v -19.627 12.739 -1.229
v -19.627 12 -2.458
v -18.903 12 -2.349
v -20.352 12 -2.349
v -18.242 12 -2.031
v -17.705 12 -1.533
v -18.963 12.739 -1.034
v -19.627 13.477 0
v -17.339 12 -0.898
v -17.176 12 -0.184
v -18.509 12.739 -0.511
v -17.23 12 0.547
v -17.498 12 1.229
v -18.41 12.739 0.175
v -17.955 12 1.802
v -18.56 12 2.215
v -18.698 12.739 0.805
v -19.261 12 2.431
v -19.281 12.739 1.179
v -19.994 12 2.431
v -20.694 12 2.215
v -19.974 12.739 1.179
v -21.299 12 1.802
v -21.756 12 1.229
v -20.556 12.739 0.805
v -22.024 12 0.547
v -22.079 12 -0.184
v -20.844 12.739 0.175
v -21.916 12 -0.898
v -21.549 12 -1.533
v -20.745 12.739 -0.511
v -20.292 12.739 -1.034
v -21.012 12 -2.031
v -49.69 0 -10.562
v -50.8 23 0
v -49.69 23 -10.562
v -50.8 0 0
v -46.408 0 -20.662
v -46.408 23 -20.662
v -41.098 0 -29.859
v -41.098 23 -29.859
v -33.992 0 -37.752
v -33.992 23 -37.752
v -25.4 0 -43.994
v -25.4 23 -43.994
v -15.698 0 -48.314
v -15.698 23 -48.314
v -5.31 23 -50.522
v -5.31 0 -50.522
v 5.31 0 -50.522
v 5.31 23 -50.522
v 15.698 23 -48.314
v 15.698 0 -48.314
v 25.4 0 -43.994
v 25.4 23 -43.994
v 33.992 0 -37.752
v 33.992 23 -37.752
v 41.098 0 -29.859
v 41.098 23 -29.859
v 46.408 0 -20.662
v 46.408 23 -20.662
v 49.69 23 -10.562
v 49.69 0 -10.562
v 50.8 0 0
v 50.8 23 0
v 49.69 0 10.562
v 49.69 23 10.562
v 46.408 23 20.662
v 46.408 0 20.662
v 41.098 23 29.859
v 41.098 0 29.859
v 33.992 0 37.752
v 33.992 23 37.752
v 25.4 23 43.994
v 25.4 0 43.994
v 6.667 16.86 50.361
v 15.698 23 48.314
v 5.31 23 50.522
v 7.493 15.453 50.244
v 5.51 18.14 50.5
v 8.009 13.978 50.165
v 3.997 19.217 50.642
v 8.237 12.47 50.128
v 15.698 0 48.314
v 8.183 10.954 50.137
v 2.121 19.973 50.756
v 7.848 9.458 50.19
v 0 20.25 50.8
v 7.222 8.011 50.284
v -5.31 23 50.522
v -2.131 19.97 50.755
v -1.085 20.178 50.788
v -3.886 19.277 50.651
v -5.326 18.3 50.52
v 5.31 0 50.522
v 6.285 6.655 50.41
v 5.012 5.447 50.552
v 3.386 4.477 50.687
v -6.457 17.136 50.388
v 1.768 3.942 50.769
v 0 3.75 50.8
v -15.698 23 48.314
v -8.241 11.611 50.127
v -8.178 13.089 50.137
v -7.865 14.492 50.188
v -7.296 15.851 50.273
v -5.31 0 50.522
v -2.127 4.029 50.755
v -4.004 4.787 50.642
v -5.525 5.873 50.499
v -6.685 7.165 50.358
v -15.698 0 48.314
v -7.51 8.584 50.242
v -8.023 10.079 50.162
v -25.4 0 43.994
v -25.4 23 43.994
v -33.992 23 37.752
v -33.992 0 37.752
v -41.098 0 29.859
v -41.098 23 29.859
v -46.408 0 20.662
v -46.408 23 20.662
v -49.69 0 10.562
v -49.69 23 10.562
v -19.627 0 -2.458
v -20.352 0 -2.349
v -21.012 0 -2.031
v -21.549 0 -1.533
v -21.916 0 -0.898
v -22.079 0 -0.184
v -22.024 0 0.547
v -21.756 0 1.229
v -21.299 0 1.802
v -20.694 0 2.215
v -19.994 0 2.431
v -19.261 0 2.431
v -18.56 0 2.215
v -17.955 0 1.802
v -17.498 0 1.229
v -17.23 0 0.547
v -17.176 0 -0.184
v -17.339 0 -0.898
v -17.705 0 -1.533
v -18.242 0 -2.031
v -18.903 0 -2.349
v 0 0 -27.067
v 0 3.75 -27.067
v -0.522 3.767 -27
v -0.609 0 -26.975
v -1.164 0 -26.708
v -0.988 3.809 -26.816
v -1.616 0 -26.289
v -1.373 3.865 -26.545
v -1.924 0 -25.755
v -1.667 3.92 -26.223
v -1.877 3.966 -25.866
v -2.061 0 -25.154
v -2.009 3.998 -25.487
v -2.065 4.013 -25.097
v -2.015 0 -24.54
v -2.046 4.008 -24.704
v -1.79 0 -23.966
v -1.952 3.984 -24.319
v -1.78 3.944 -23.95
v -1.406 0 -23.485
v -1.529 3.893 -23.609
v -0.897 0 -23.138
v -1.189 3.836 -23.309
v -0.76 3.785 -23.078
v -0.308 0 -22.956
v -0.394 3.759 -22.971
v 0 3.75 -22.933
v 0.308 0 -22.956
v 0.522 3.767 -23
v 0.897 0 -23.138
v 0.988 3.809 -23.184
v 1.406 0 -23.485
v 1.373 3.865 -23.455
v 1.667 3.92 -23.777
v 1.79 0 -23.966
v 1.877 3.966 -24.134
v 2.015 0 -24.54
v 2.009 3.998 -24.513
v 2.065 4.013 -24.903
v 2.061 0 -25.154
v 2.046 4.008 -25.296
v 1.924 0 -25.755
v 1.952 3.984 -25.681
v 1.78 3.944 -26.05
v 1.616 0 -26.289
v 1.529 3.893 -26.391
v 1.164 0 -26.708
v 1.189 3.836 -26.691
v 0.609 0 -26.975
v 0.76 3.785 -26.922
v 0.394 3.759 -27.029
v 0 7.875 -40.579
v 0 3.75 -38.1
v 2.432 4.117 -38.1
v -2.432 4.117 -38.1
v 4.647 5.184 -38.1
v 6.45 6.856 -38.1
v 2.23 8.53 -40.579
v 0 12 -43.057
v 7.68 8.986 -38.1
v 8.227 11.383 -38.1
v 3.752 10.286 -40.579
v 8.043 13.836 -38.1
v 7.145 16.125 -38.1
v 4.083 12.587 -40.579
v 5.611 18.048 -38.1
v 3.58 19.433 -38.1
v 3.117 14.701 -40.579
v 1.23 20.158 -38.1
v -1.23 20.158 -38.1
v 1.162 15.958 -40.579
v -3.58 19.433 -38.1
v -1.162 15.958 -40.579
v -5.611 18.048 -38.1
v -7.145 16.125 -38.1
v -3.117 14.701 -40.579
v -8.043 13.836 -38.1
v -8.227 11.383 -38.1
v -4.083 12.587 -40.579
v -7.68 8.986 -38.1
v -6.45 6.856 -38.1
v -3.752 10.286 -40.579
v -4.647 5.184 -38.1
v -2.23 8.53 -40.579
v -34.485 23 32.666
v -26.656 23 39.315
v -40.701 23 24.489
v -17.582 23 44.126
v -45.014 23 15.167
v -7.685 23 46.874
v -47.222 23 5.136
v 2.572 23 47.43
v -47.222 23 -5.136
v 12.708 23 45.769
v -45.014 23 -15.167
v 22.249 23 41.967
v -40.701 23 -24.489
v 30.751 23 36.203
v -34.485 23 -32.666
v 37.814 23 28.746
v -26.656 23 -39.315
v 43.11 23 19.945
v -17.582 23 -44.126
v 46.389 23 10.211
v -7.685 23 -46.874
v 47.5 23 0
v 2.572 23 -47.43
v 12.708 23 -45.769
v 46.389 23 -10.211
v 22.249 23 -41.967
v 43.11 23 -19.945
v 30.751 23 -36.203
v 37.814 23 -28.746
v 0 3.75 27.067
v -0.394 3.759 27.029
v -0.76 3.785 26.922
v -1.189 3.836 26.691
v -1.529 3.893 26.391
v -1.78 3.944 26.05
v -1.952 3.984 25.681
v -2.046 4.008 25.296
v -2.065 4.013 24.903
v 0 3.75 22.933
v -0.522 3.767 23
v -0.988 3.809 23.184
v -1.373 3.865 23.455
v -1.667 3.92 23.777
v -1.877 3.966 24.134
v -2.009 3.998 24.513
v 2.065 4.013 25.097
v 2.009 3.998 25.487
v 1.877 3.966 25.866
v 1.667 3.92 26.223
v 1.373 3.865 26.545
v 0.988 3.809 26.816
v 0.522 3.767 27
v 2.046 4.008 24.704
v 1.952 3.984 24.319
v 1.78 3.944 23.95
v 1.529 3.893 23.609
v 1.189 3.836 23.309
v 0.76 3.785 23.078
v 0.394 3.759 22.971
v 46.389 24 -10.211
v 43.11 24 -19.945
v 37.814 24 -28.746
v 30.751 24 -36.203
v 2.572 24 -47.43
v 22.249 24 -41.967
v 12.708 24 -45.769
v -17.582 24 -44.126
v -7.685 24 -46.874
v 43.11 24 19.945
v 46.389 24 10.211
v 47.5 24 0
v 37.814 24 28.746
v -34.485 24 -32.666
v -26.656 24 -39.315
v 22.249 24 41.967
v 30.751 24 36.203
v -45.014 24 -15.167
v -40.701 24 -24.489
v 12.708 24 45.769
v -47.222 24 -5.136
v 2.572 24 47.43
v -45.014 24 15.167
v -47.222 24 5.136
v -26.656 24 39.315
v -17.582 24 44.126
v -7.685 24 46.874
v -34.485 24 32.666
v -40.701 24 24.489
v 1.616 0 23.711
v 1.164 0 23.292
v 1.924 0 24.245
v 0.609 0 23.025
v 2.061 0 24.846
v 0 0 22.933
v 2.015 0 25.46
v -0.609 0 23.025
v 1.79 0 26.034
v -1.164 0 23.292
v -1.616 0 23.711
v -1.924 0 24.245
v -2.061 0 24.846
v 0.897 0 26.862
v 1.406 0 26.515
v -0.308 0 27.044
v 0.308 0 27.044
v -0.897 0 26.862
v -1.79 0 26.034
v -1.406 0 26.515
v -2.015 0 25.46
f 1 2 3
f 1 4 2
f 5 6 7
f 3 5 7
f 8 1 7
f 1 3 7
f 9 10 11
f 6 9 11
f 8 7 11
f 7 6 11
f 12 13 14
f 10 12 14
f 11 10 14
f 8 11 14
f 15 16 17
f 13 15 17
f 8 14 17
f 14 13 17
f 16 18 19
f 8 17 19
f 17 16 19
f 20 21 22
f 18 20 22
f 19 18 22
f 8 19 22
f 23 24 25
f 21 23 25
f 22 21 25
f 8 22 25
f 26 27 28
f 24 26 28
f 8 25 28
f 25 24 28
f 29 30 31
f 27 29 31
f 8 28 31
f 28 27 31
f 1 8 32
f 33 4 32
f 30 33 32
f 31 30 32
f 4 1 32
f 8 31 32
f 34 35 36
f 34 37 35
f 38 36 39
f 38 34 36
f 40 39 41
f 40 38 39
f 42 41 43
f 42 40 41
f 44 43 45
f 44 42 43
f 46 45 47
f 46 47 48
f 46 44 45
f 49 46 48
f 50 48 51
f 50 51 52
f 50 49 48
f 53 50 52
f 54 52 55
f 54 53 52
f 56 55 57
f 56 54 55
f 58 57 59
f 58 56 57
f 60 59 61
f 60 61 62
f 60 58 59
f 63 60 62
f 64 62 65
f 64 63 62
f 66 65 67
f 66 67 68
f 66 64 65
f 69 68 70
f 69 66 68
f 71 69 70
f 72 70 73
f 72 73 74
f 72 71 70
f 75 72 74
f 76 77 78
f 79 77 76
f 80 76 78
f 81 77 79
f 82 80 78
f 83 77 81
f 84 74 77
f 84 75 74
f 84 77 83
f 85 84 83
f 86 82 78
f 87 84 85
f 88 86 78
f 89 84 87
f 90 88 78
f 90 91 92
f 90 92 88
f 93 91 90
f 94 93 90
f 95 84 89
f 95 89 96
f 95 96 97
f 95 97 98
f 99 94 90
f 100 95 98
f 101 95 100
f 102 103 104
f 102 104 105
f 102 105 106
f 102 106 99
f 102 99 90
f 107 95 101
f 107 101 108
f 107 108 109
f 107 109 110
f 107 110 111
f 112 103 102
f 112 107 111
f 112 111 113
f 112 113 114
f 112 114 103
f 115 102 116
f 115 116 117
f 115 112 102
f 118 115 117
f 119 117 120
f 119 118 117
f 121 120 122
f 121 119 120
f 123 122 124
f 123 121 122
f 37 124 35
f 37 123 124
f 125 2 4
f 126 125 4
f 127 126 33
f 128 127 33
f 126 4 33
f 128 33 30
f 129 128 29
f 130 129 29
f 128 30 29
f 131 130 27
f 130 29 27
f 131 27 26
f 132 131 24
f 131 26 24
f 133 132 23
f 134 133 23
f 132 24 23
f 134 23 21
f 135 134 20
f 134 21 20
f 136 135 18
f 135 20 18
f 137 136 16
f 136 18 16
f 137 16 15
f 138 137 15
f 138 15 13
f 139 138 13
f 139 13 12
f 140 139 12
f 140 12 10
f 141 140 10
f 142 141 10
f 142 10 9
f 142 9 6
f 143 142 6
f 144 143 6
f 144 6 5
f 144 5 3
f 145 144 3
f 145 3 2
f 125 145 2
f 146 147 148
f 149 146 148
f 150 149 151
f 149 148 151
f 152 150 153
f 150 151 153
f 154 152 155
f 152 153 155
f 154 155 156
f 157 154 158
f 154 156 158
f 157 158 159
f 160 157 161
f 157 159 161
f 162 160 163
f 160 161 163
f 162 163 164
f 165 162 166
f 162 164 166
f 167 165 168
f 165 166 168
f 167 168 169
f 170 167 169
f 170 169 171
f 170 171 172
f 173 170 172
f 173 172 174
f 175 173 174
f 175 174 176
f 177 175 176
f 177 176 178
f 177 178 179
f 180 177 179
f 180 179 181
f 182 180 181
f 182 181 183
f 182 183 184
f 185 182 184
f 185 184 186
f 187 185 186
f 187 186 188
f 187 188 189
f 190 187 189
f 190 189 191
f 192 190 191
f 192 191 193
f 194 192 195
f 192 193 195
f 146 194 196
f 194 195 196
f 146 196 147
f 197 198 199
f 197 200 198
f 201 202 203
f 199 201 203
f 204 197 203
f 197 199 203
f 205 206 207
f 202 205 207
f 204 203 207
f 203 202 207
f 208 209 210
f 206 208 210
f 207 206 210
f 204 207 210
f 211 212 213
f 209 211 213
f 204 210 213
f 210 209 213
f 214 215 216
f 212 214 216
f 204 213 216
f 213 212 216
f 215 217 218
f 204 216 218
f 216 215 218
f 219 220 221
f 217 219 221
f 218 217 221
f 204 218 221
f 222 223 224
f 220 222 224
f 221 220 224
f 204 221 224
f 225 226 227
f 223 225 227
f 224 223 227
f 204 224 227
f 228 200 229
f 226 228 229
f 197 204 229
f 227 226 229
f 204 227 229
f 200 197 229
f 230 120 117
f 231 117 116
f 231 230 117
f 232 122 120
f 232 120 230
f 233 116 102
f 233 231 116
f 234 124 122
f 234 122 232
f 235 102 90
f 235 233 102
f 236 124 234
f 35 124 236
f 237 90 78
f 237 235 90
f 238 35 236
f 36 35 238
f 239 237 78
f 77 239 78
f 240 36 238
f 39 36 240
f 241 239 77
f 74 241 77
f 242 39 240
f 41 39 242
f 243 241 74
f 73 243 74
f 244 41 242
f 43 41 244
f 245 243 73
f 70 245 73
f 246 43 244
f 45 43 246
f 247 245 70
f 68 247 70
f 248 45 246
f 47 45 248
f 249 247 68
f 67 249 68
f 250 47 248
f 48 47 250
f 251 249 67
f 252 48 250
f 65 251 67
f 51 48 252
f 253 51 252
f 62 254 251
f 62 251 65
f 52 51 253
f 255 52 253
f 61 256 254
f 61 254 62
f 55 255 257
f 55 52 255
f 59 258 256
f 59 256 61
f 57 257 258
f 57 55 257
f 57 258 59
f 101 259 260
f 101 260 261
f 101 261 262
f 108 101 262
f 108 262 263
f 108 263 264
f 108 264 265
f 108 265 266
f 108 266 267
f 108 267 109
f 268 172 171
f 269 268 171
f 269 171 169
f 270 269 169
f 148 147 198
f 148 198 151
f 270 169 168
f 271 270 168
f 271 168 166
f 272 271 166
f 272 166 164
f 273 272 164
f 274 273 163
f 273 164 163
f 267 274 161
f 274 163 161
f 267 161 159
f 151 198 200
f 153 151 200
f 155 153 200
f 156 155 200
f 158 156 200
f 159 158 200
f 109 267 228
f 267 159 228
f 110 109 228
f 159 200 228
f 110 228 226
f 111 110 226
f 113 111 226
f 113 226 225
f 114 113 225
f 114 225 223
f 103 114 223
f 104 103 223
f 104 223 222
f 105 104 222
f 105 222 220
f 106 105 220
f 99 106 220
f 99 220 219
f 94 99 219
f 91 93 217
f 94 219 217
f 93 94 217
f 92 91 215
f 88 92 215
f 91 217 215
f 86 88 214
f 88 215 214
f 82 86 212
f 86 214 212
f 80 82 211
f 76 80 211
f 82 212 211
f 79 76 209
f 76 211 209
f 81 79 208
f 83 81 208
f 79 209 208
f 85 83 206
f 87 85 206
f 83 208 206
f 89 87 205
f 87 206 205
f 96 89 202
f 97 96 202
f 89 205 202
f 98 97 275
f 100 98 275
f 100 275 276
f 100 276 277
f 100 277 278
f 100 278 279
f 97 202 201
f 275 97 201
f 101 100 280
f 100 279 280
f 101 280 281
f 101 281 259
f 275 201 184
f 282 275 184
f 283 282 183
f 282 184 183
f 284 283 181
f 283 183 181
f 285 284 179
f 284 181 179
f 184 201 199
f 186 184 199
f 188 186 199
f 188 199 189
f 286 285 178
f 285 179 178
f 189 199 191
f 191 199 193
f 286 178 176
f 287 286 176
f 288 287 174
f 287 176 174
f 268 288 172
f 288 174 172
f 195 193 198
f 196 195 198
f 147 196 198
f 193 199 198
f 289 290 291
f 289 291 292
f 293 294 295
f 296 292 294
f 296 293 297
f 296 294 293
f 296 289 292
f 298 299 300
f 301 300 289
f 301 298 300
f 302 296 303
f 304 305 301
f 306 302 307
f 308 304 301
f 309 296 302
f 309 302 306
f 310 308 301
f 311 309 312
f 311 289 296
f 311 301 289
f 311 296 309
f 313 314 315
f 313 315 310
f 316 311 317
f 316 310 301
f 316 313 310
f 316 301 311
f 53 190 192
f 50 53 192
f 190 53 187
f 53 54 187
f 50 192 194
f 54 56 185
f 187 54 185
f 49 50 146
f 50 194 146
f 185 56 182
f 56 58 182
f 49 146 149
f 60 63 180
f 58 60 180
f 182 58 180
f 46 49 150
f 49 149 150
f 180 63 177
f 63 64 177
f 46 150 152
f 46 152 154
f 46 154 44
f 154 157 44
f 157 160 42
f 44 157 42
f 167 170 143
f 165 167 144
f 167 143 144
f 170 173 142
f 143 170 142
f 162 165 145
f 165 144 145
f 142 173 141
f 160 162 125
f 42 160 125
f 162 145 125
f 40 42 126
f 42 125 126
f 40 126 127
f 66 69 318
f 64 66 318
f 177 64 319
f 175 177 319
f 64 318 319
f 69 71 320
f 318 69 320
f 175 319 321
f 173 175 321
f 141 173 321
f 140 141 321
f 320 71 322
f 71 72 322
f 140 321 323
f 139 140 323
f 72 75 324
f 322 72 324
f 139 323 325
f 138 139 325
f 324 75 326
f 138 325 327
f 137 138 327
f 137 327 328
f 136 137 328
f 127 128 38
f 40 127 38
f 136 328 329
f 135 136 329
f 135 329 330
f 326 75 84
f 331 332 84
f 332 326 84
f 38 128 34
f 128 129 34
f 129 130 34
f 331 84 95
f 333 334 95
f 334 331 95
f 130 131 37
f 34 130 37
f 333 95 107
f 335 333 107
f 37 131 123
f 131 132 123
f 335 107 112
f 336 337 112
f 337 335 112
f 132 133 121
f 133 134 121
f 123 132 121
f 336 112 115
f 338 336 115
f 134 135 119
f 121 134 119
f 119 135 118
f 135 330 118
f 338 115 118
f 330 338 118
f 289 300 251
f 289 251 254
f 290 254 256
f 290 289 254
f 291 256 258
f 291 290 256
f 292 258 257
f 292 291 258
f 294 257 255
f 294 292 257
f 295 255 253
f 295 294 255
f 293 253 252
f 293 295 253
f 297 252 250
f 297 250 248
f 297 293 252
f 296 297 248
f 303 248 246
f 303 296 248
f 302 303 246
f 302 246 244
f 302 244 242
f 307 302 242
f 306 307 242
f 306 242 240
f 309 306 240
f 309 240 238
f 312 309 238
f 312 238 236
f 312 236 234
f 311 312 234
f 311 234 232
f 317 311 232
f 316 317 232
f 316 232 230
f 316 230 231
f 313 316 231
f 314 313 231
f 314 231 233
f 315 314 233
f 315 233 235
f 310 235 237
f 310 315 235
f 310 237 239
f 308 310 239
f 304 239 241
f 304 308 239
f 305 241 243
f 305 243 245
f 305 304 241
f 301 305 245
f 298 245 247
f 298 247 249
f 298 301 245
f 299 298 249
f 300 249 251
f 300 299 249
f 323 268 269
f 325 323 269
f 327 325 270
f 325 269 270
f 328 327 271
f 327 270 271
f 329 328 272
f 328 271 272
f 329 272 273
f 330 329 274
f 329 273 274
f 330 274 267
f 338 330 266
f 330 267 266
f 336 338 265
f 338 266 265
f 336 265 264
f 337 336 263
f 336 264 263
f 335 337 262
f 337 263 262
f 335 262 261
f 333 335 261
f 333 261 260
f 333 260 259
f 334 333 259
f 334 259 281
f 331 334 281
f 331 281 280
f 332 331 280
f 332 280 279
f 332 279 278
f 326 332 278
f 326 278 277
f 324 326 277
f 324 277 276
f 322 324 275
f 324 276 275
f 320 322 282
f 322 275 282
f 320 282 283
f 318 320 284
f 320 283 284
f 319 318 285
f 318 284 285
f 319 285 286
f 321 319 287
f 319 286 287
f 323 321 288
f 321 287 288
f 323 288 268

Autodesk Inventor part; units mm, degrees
ref_plane "YZ Plane" through (0, 0, 0) normal (1, 0, 0) x (0, 1, 0)
ref_plane "XZ Plane" through (0, 0, 0) normal (0, 1, 0) x (-1, 0, 0)
sketch "Sketch1" plane through (0, 0, 0) normal (0, 1, 0) x (-1, 0, 0)
  circle A0 centre (0, 0) radius 50.8
  dimension "d0" = 101.6
extrude "Extrusion1" add sketch "Sketch1" along normal blind 24
ref_plane "Work Plane1" through (0, 0, 50.8) normal (0, 0, 1) x (1, 0, 0)
sketch "Sketch3" plane through (0, 0, 50.8) normal (0, 0, 1) x (1, 0, 0)
  line L0 (50.8, 24) -> (-50.8, 24) projected
  line L1 (0, 24) -> (0, 12) construction
  point P0 (0, 0)
  dimension "d7" = 12
hole "Hole1" at (0, 12, 50.8) direction (0, 0, -1) diameter 16.5 depth 88.9 tip angle 118
sketch "Sketch4" plane through (0, 0, 0) normal (0, -1, 0) x (1, 0, 0)
  line L0 (0, 0) -> (0, -25) construction
  line L1 (0, 0) -> (0, 25) construction
  dimension "d15" = 25
  dimension "d16" = 25
hole "Hole2" at (0, 0, 25) at (0, 0, -25) direction (0, 1, 0) diameter 4.134 end up to surface thread size "M5x0.8" class "6H" standard "ANSI Metric M Profile"
sketch "Sketch5" plane through (0, 0, 0) normal (0, -1, 0) x (1, 0, 0)
  point P0 (0, 0)
  point P1 (-19.6272, 0)
hole "Hole3" at (-19.6272, 0, 0) direction (0, 1, 0) diameter 4.917 depth 12 tip angle 118 thread size "M6x1" class "6H" standard "ANSI Metric M Profile"
ref_plane "Work Plane2" through (0, 0, -38.1) normal (0, 0, 1) x (1, 0, 0)
sketch "Sketch7" plane through (0, 24, 0) normal (0, 1, 0) x (1, 0, 0)
  circle A0 centre (0, 0) radius 50.8
  circle A1 centre (0, 0) radius 47.5
  dimension "d35" = 101.6
  dimension "d36" = 95
extrude "Extrusion4" cut sketch "Sketch7" against normal blind 1
properties part number "Platogrueso" material "Aluminum 6061"
